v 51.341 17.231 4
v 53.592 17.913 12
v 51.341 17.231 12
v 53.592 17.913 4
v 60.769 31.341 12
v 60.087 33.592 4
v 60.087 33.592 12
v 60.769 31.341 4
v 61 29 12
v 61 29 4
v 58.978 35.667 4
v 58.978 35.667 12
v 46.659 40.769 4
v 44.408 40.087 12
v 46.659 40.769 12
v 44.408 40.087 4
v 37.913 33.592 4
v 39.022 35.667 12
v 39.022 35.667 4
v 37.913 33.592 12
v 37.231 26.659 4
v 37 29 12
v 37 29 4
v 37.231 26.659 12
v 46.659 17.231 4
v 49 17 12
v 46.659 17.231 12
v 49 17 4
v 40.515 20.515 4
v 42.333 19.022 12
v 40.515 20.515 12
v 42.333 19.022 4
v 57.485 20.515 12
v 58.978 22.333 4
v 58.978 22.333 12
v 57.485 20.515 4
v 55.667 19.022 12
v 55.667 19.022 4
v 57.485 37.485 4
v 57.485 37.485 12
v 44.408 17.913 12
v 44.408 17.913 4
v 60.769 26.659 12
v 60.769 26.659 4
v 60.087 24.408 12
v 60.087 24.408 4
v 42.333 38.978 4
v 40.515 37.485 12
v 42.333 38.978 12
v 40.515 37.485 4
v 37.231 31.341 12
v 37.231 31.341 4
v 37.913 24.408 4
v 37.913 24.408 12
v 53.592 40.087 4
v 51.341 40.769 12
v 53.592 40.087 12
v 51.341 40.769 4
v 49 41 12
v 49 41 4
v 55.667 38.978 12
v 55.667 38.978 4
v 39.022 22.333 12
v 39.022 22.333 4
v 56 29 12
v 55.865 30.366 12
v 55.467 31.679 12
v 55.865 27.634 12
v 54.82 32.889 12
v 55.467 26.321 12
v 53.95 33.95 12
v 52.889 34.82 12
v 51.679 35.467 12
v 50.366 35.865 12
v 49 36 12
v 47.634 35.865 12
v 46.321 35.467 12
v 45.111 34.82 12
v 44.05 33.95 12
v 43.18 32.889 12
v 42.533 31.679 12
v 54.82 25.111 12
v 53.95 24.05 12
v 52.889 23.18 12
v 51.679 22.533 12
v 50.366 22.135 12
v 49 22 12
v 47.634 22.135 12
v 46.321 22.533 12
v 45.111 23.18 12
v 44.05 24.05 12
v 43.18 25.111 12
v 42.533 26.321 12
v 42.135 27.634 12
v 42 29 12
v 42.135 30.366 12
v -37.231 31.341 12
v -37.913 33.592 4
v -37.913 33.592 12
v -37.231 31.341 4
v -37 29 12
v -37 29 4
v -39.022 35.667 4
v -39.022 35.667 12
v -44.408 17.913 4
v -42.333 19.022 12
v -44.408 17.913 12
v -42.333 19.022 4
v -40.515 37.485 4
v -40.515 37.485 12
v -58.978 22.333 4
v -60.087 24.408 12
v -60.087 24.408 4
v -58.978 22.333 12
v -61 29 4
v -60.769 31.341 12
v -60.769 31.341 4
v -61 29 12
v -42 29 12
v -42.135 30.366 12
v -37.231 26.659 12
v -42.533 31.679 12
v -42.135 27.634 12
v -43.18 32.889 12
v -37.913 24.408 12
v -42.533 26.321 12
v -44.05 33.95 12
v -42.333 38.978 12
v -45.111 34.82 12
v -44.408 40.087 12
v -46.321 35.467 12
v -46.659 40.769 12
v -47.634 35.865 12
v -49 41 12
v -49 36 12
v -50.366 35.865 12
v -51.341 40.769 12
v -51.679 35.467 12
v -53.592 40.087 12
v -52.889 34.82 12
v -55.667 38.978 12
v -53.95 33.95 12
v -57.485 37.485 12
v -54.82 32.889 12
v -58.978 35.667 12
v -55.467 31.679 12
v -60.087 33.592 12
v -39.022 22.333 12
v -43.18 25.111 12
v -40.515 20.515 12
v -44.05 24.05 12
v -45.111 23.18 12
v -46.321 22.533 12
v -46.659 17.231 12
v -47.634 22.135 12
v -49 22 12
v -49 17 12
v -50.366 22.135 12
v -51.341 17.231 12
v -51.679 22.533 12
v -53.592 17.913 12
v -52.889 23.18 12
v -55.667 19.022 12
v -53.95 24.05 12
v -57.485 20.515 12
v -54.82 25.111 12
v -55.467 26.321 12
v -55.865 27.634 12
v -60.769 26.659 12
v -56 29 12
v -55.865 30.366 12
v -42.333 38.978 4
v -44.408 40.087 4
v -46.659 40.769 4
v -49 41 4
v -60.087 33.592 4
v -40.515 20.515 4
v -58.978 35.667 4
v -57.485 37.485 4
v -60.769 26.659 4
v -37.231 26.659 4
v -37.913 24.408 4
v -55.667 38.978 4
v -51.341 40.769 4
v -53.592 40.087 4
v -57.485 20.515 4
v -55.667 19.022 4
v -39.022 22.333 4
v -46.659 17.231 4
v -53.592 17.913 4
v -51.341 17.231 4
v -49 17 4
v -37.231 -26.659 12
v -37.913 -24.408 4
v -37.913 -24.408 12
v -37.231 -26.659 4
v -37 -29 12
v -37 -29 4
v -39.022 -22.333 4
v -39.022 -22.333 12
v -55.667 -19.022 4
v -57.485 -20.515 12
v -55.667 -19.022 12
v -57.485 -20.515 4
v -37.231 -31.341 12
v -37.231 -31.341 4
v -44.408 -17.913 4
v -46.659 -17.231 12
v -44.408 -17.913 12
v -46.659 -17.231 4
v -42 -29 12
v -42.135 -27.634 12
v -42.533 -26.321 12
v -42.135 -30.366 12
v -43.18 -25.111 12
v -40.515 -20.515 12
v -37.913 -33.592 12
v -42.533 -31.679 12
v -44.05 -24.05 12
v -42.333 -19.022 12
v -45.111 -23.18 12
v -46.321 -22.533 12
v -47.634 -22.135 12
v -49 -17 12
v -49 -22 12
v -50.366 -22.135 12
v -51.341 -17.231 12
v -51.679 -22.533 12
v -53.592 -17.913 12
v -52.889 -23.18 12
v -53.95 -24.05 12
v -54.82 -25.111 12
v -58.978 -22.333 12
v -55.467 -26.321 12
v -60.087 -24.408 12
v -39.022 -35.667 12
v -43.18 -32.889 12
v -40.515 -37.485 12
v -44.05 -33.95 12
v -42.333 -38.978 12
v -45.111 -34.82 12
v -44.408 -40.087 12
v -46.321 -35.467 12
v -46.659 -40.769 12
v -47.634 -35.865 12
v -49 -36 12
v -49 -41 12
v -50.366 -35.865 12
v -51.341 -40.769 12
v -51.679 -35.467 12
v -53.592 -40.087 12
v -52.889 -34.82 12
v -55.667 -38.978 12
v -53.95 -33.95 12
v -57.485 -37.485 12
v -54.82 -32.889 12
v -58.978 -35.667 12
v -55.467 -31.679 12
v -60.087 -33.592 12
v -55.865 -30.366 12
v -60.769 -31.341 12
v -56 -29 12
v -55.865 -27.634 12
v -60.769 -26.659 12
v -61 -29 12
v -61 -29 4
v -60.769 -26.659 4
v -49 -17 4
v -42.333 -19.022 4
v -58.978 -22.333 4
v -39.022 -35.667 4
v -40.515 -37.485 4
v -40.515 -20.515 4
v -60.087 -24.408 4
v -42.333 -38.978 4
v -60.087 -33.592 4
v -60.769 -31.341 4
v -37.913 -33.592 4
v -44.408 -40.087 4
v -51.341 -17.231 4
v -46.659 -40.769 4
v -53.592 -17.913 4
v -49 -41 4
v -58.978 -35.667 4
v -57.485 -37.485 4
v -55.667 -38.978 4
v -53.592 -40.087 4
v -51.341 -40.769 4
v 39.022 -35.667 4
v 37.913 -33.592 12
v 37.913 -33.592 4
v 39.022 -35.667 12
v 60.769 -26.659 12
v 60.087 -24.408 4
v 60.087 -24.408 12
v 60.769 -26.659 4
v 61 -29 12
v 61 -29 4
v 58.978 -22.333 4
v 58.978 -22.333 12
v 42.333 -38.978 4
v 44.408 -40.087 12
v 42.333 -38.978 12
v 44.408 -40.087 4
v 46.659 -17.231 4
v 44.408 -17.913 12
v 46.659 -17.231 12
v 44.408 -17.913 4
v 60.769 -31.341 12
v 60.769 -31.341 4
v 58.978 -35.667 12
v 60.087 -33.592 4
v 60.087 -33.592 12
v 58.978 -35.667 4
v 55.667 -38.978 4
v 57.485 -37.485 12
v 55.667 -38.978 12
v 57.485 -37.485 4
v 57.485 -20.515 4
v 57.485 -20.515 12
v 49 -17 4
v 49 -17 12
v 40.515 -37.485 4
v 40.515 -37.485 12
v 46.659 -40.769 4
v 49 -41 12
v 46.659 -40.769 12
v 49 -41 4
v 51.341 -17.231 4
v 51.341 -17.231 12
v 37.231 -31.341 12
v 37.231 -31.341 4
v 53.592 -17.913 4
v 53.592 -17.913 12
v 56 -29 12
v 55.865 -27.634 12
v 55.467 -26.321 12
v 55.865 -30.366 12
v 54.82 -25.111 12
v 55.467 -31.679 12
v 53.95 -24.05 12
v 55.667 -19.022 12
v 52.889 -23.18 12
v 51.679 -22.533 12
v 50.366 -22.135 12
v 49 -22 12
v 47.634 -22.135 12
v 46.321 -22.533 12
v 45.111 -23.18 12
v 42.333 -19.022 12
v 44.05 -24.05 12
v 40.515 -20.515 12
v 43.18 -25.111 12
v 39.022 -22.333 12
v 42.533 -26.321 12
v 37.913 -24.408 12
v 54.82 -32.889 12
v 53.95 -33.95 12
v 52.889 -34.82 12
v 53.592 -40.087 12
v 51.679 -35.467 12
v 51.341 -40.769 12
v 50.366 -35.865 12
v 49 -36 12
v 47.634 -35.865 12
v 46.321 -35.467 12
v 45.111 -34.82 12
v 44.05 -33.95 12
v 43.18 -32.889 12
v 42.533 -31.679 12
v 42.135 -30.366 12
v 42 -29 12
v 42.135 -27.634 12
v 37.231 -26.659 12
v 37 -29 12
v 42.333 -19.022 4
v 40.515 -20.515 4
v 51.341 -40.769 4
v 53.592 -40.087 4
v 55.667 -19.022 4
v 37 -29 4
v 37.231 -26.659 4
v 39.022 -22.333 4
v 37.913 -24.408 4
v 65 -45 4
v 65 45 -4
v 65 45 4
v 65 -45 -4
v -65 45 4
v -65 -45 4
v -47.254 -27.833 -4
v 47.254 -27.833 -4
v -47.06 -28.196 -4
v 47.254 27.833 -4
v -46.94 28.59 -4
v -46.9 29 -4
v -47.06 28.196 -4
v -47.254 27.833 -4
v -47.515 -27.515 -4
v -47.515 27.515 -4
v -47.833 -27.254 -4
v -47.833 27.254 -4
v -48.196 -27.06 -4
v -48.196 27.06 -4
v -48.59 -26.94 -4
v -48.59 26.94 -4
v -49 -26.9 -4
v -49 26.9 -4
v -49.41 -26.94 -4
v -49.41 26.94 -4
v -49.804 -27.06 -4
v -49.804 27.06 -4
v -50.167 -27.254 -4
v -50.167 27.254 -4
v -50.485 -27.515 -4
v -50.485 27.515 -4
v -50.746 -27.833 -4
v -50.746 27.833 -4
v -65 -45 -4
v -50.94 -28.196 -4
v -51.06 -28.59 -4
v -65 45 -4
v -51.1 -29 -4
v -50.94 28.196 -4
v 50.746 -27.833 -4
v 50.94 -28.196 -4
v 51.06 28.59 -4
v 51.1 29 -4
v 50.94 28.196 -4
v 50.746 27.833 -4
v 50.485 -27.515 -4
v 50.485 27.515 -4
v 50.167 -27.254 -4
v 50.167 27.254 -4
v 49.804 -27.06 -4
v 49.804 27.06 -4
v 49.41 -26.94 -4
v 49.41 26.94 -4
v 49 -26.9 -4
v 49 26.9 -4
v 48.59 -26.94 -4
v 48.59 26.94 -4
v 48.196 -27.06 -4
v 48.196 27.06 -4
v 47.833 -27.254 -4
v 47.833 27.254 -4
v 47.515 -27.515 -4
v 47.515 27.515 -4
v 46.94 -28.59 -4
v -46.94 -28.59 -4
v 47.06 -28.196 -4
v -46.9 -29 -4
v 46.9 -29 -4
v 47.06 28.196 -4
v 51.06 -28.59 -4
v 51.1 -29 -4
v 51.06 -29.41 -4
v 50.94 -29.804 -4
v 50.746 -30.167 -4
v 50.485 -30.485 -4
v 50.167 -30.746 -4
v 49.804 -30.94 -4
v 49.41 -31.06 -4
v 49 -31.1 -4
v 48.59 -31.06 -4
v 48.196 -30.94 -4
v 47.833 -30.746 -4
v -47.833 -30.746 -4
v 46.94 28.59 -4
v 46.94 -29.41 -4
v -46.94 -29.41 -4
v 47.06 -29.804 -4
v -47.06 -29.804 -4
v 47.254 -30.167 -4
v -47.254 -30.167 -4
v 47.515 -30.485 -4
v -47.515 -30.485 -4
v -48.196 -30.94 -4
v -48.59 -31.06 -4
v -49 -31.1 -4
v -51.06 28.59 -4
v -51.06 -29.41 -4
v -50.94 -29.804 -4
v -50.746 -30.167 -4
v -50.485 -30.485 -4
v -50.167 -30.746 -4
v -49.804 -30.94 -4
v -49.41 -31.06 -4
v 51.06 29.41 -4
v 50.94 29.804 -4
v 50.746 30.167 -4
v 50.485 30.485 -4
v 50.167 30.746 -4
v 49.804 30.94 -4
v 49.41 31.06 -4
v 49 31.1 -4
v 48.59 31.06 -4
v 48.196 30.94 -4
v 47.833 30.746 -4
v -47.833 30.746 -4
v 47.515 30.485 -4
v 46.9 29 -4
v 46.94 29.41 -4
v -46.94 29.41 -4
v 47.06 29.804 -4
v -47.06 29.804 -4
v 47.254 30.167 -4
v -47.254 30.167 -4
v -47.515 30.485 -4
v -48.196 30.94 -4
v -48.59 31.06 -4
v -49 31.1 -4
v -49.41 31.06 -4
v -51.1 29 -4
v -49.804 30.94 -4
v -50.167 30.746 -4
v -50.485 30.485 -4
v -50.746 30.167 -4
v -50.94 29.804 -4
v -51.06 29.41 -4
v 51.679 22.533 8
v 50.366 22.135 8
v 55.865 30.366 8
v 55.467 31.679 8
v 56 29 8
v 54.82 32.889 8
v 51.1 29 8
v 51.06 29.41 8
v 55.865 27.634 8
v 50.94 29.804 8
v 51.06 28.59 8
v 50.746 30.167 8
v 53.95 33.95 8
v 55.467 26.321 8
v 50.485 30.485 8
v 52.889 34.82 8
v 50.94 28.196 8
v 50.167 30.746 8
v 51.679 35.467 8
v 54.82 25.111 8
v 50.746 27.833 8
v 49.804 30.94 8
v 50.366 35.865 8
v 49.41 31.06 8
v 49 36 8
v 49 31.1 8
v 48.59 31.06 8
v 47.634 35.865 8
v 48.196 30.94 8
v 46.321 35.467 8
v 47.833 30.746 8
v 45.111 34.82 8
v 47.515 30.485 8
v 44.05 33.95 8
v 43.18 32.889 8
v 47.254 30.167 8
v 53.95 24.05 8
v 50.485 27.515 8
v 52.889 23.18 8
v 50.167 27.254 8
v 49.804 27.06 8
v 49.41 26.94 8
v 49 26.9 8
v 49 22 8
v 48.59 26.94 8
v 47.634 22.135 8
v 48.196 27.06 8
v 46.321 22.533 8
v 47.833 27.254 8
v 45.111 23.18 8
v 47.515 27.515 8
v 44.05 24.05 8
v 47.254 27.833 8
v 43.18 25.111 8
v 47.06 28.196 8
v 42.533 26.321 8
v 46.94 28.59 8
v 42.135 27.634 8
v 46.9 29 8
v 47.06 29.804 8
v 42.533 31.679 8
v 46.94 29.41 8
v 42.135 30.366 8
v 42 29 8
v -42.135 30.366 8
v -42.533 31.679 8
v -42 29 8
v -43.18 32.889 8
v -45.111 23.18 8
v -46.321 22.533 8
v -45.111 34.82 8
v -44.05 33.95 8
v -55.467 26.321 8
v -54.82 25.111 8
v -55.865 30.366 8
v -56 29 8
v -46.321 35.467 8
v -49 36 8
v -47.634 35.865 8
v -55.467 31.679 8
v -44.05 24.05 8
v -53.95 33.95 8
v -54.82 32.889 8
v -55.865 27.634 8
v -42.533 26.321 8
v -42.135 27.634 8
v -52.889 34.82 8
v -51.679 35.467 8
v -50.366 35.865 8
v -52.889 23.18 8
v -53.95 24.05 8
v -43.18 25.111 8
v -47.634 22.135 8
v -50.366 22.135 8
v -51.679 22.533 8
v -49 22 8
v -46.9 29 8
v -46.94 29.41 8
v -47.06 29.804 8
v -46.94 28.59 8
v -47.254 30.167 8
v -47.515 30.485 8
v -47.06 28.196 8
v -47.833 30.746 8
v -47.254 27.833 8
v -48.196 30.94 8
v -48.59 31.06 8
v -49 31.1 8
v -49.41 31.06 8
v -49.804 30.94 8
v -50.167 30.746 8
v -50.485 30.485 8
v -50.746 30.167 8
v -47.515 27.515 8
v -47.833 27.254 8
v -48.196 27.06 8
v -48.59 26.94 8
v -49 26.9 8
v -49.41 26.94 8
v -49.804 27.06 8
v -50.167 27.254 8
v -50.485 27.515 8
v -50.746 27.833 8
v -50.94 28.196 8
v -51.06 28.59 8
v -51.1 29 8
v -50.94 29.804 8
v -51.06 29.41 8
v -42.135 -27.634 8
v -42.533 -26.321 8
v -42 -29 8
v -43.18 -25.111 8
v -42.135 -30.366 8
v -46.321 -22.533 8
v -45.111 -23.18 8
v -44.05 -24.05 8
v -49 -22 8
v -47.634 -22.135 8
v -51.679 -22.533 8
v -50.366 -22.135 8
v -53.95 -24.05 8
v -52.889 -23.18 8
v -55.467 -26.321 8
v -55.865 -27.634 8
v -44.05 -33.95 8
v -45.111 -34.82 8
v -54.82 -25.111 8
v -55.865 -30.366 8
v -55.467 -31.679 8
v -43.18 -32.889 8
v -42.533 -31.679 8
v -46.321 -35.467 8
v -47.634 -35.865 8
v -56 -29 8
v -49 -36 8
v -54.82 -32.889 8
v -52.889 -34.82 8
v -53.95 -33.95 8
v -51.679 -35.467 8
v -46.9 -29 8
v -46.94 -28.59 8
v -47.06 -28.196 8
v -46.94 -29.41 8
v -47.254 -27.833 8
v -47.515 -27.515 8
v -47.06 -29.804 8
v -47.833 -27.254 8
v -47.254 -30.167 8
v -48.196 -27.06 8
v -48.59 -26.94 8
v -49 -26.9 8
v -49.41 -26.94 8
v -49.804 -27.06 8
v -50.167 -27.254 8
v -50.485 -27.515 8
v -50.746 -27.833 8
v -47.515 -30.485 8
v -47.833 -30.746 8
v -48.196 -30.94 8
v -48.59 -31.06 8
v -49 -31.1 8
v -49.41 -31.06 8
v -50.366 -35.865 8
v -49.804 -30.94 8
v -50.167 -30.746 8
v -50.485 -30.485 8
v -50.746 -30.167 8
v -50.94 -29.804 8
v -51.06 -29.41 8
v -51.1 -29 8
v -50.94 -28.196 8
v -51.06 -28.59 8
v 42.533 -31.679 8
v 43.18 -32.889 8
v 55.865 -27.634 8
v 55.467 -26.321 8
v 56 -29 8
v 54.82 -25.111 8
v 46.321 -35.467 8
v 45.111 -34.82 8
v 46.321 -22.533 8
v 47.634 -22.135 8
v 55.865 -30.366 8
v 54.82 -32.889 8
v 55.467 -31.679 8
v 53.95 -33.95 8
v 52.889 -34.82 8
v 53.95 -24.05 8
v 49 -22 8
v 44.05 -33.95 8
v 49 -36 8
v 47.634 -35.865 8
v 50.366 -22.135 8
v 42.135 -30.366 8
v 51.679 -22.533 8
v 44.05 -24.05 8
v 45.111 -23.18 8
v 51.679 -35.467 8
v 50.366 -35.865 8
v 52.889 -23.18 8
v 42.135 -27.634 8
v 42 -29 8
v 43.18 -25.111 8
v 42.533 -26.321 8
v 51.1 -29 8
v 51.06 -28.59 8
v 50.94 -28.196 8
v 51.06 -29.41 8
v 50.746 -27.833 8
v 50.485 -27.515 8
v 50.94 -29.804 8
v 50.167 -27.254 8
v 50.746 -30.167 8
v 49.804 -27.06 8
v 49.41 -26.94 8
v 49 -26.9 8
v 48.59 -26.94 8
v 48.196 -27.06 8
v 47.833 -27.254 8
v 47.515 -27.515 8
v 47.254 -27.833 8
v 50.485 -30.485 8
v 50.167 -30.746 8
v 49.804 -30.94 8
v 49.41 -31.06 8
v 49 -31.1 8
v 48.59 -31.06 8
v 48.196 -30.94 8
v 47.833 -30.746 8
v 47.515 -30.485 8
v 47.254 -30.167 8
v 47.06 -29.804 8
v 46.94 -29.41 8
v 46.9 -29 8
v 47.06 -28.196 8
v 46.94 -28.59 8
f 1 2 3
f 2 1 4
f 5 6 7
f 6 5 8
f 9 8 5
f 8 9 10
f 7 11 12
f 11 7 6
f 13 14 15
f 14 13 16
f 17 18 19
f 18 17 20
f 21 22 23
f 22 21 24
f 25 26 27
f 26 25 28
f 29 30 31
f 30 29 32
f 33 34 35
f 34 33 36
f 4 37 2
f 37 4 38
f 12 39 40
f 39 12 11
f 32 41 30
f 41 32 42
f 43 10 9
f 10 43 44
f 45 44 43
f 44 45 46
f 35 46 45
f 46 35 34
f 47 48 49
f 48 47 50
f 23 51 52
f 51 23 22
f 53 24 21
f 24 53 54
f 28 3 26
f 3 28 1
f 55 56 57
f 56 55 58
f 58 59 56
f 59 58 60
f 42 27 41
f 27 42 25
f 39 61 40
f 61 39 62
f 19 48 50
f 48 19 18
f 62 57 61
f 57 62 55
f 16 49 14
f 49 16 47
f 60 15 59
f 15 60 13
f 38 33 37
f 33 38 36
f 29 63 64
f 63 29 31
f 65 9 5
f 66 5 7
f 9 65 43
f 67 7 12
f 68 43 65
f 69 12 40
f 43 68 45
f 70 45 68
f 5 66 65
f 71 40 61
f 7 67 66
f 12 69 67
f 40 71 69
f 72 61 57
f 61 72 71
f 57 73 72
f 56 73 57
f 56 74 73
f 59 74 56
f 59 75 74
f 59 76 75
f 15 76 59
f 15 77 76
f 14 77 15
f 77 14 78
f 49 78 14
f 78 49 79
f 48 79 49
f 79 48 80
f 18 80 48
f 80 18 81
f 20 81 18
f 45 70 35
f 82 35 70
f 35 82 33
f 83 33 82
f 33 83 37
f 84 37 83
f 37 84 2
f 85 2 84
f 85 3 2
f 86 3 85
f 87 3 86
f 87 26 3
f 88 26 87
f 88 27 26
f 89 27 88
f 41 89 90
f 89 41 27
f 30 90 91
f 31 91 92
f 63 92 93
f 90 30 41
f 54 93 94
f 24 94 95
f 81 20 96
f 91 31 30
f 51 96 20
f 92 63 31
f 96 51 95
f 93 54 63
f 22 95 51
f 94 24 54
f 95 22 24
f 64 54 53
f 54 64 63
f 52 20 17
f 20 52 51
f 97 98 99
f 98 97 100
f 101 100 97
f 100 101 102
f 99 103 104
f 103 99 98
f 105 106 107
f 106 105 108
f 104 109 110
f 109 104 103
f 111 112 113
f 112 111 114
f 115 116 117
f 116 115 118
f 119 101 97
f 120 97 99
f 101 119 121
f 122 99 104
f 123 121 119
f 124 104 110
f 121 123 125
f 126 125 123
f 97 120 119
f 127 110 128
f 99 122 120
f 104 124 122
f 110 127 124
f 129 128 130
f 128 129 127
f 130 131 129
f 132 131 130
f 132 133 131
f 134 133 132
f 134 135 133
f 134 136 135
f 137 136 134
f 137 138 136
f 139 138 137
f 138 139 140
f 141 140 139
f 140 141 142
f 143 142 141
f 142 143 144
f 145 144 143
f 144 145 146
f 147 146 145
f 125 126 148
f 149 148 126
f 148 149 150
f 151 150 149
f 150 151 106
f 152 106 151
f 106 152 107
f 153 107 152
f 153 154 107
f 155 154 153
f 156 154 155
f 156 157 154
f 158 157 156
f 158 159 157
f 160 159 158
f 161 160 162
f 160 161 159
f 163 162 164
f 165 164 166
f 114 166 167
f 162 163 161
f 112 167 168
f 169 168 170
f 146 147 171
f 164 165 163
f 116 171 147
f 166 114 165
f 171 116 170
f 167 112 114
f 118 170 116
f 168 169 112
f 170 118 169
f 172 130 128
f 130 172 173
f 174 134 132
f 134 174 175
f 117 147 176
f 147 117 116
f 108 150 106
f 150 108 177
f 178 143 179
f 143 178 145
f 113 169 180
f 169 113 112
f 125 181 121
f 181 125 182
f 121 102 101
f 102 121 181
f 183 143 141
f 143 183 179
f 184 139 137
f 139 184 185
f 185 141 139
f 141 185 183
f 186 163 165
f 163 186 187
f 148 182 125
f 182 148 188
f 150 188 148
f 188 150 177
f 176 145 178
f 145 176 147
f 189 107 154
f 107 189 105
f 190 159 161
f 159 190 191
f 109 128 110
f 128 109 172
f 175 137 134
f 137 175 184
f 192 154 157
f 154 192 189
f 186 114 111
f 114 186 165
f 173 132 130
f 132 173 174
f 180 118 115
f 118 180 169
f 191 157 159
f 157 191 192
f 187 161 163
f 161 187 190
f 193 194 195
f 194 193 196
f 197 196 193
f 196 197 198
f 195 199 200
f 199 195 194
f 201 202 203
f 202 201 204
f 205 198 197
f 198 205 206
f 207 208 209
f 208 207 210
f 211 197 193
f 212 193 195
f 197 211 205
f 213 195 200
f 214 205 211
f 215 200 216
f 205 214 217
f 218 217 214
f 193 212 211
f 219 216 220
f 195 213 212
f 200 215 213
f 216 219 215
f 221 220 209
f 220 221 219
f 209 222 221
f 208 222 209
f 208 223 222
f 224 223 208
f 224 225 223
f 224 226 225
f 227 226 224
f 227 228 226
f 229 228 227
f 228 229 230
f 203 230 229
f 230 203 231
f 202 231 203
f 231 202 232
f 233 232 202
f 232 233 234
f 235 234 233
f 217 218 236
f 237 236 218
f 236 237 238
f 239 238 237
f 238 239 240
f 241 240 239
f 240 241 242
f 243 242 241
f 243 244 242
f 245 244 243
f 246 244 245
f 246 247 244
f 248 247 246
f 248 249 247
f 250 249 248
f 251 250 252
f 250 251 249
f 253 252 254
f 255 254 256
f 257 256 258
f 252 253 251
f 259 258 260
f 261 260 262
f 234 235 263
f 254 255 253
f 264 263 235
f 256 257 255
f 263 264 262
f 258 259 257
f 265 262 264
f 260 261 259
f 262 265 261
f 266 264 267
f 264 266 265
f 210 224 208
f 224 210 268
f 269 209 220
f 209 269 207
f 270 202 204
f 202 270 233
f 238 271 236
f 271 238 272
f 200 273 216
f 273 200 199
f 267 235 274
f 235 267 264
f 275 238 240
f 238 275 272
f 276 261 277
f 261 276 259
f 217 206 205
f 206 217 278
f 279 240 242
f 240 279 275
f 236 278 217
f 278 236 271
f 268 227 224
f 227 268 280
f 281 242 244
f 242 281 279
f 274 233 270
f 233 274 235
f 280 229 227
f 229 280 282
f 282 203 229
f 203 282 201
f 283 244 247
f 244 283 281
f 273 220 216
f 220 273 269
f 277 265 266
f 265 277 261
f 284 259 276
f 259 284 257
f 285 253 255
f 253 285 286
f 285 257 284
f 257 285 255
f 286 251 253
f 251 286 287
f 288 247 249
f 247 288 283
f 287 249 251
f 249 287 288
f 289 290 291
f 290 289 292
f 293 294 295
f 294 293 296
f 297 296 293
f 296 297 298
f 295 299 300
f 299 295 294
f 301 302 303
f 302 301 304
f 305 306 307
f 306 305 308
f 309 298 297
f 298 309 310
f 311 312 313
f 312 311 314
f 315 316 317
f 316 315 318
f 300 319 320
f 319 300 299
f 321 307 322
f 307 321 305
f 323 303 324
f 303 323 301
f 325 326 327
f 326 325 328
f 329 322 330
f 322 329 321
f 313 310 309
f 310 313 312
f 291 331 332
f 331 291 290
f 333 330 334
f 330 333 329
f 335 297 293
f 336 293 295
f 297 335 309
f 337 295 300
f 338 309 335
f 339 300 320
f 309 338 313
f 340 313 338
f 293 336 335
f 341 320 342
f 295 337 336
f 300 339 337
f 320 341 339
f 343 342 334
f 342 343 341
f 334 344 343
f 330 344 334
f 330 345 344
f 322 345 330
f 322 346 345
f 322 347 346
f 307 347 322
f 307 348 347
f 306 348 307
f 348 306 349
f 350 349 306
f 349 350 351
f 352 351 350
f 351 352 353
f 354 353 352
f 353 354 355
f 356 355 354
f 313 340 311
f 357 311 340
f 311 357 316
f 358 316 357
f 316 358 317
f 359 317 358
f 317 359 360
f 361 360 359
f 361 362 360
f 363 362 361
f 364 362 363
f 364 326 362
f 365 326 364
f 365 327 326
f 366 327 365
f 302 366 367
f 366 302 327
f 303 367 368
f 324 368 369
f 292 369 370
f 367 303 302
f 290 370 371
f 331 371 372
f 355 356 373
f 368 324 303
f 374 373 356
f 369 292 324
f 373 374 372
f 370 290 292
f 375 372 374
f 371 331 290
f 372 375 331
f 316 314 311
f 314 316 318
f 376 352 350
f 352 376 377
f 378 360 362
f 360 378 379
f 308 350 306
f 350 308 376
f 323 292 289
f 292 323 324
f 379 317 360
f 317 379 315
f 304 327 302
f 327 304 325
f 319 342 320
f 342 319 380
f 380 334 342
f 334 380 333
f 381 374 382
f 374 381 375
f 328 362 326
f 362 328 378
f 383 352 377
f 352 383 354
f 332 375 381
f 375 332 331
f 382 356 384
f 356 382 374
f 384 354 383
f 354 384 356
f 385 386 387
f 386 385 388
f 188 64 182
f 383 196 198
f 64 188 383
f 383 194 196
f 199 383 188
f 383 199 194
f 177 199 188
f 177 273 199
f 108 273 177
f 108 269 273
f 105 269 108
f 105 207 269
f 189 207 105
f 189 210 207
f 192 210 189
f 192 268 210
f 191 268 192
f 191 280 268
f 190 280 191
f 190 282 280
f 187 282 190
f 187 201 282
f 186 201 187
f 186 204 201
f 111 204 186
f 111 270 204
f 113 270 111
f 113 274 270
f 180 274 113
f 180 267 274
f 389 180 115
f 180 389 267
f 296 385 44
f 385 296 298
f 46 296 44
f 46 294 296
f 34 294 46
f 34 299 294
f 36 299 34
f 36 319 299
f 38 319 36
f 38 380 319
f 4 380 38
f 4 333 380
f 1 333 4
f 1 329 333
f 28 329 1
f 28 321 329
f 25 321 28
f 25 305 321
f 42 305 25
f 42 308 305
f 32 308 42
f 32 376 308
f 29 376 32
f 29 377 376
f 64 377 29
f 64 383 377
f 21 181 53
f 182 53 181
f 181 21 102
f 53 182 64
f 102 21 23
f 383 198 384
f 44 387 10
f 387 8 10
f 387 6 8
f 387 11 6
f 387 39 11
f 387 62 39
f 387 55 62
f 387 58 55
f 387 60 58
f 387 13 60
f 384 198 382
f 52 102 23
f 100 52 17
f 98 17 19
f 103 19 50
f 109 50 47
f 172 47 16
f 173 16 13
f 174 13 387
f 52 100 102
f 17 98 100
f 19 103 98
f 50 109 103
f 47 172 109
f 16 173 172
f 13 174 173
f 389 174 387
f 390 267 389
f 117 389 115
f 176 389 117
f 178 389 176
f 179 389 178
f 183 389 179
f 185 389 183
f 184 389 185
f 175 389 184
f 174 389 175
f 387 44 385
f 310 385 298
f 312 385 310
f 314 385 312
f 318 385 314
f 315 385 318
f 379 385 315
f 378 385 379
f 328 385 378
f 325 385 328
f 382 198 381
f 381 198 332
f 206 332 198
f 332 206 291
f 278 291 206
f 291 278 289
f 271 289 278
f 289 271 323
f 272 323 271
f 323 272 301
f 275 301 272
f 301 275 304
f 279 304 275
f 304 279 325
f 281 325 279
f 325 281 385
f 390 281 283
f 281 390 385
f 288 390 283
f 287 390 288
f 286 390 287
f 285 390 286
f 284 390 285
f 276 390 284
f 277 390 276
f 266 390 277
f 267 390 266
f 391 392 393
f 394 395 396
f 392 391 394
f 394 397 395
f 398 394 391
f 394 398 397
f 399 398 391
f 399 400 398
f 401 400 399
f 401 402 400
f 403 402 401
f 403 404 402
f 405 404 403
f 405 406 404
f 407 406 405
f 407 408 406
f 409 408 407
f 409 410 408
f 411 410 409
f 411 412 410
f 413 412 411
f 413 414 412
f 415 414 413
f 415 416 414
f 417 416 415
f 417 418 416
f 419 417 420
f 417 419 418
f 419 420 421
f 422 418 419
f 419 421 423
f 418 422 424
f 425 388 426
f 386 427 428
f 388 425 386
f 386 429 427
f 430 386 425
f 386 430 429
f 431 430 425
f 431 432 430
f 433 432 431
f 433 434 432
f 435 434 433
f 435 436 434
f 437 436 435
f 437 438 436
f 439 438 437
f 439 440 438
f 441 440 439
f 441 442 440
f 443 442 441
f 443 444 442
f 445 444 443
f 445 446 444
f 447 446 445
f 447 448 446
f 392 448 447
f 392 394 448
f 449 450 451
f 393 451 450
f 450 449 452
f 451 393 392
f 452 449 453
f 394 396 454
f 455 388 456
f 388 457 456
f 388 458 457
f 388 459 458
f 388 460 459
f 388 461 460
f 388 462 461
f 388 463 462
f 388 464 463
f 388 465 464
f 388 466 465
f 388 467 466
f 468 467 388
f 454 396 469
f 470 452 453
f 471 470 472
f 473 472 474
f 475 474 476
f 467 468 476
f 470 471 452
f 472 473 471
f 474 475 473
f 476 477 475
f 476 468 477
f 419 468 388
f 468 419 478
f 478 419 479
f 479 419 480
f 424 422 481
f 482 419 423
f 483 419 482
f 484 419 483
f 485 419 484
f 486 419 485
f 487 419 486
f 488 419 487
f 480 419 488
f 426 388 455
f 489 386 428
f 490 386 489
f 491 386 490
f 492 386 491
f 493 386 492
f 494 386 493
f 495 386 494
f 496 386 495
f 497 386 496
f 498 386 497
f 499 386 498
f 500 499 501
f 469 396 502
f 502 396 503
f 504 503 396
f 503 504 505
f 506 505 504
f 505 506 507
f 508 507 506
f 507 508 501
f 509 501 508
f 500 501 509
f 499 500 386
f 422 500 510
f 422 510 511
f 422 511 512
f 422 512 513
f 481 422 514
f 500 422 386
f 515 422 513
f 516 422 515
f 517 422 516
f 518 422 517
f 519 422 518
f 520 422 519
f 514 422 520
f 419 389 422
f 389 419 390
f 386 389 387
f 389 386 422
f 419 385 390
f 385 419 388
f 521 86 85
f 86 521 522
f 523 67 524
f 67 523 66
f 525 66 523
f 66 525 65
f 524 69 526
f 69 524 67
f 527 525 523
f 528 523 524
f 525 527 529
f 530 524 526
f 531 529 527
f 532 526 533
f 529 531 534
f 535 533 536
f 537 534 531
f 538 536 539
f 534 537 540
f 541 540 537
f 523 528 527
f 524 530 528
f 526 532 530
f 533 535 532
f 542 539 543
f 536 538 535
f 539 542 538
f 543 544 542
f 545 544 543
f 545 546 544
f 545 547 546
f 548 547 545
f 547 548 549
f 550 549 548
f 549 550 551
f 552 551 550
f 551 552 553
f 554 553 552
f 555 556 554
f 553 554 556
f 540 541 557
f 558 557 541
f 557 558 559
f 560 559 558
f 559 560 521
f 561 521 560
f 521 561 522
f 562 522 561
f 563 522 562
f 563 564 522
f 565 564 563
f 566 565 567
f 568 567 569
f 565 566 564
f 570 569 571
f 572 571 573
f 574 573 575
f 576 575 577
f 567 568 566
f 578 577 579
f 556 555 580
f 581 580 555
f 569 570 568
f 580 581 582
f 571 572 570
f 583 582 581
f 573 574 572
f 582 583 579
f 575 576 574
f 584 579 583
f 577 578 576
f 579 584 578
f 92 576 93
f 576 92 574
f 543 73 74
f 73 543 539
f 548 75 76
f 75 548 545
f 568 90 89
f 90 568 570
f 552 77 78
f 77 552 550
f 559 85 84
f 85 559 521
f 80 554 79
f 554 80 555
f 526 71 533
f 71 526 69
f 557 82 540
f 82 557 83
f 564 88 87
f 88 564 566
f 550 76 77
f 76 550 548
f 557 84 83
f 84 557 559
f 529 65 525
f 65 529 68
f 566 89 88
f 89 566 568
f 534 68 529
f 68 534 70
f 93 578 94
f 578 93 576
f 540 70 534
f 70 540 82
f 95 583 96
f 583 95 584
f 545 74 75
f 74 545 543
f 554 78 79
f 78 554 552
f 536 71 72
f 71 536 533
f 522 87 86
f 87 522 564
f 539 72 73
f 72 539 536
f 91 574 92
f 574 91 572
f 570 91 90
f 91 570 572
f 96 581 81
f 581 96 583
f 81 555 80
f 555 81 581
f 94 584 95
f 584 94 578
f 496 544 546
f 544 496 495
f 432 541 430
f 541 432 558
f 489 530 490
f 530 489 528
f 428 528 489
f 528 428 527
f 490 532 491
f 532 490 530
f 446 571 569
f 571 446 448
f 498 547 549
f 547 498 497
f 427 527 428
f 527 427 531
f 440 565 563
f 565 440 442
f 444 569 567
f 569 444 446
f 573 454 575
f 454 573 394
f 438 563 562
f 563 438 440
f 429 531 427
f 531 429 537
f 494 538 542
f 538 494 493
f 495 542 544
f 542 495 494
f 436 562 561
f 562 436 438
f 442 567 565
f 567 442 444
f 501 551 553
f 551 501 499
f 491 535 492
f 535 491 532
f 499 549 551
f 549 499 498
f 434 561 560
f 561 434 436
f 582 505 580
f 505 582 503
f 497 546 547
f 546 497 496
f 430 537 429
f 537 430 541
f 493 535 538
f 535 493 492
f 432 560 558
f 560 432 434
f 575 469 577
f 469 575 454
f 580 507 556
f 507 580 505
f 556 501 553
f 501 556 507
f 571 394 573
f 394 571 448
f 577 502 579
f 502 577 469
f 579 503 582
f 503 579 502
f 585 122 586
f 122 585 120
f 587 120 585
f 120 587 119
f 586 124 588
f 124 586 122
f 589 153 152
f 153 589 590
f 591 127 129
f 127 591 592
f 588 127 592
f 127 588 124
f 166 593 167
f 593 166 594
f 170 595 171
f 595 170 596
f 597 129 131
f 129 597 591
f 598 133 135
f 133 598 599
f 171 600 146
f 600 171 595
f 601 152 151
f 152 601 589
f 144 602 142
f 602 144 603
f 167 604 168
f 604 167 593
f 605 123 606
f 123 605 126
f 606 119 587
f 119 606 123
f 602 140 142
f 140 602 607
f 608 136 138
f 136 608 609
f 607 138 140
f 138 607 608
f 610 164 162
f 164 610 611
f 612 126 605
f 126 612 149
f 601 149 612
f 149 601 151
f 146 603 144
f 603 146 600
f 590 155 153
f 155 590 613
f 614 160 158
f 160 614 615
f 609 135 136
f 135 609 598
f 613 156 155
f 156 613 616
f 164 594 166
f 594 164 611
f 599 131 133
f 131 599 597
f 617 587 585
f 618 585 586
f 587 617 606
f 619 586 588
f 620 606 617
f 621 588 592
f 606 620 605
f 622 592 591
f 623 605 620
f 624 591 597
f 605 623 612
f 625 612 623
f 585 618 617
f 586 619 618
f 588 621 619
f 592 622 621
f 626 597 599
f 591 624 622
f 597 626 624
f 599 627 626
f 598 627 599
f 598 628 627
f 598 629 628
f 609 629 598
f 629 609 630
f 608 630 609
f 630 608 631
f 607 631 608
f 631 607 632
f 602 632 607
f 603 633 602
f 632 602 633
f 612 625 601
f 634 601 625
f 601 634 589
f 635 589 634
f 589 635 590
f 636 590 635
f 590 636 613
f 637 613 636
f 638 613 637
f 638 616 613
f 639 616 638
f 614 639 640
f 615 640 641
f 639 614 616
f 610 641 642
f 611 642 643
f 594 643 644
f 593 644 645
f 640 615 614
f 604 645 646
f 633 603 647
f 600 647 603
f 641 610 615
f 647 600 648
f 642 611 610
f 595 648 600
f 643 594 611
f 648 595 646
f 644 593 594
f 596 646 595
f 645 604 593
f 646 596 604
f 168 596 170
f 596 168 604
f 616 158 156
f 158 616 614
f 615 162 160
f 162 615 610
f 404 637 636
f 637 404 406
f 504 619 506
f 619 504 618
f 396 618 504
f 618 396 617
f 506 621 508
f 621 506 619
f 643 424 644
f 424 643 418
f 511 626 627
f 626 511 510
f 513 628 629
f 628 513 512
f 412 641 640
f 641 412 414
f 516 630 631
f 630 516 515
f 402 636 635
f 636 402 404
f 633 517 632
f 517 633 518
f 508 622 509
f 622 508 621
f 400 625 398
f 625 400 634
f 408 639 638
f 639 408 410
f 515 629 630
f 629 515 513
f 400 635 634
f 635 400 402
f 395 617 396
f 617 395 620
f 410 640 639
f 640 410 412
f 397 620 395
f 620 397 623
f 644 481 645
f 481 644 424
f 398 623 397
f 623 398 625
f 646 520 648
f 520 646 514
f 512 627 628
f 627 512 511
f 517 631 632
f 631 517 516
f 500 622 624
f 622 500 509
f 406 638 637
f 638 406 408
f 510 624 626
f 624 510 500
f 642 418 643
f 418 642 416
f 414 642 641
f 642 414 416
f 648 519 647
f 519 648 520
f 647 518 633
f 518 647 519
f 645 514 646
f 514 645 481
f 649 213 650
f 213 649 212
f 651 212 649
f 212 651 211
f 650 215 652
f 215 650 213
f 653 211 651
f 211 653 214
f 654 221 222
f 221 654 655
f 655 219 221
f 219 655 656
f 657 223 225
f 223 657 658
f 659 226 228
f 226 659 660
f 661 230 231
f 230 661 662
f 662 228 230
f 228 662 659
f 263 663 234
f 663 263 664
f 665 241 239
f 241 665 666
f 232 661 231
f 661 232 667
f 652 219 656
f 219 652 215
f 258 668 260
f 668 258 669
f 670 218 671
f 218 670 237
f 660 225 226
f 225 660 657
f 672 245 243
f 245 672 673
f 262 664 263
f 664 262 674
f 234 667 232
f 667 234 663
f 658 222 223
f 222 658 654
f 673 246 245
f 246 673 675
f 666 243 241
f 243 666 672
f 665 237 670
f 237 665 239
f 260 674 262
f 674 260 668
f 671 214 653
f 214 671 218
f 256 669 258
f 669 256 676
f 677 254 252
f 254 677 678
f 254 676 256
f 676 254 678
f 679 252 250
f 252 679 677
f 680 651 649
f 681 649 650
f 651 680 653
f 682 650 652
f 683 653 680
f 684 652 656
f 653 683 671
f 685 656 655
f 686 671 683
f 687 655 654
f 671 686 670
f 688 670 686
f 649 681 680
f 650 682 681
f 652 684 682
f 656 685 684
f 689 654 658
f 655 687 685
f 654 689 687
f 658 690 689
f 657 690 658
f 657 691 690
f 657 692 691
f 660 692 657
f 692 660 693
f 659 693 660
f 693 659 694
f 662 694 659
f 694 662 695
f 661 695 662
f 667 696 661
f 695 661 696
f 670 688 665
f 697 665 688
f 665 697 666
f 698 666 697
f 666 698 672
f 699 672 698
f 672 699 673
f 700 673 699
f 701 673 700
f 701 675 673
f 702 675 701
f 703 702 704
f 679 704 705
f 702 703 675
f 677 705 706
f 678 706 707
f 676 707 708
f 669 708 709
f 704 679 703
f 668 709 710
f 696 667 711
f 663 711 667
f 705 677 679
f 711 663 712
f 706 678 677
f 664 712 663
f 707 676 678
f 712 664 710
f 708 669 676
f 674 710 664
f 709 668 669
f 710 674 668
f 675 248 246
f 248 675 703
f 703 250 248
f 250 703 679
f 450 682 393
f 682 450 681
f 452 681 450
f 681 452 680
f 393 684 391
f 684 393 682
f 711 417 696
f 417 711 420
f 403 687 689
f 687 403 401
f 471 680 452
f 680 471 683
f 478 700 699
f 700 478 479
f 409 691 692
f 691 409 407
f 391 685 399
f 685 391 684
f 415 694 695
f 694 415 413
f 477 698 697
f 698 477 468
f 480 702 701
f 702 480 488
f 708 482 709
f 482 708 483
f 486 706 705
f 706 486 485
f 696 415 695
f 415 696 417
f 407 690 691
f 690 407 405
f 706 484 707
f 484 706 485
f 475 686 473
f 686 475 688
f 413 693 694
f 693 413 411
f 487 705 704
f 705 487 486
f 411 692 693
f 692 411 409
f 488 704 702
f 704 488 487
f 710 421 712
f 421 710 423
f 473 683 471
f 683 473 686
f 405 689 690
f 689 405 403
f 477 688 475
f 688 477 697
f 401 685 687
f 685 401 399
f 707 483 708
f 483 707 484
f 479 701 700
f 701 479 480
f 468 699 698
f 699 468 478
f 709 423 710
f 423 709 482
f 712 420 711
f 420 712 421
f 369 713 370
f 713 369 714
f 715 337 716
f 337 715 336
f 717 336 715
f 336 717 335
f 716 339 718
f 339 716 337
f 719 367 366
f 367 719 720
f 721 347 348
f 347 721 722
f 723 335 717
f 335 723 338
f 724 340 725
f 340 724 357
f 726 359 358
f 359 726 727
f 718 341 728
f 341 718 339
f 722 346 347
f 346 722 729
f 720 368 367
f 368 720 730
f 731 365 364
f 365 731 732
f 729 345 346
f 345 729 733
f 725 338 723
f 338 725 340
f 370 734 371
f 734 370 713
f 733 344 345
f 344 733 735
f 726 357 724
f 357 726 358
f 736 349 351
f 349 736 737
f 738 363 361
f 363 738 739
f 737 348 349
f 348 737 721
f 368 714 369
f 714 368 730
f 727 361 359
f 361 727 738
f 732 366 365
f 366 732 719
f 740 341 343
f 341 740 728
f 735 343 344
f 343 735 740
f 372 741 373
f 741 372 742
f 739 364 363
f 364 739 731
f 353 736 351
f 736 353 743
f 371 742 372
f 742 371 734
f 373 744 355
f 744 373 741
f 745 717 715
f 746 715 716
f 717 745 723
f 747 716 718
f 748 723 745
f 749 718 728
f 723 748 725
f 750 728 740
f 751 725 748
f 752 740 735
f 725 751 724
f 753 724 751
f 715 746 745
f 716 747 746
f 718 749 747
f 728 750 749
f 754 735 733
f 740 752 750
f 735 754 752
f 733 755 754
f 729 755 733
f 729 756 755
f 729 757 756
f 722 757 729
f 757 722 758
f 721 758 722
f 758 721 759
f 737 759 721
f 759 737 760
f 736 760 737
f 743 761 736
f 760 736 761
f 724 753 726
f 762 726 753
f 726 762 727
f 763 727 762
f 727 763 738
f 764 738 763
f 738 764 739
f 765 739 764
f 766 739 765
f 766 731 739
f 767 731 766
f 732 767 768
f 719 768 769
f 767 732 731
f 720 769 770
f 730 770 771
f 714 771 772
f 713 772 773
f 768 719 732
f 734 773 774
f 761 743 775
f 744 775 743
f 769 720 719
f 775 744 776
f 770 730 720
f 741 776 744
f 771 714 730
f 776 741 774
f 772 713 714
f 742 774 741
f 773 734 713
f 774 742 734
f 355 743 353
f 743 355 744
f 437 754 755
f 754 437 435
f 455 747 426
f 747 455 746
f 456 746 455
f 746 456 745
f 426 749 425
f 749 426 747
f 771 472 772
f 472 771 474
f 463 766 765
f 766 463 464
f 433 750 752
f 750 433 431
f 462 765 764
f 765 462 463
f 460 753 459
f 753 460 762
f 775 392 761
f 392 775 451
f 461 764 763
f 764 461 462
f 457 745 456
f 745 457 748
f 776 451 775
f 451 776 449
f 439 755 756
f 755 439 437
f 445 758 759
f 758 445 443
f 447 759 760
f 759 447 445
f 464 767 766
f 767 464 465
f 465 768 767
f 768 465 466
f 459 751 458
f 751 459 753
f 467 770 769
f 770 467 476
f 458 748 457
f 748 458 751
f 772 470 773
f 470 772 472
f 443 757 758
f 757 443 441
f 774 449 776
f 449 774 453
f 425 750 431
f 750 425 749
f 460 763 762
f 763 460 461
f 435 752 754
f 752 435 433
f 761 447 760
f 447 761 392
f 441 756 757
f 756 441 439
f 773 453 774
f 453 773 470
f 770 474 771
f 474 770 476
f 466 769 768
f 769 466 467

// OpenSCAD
$fn = 32;

// ----------------------------------------------------------------------
// Socket pad plate
// bosses with counterbored sockets for the screws
// ----------------------------------------------------------------------

// --- parameters (mm) ---
base_t = 8;            // base plate thickness
boss_h = 8;            // boss height above the base plate
boss_d = 24;           // boss diameter
socket_d = 14;         // socket diameter
socket_depth = 4;      // socket depth from the boss face
bolt_d = 4.2;          // screw clearance hole through the socket floor
plate = [130, 90, 8];  // overall size (x, y, z)
edge = 16;             // boss centre offset from the plate edge
pads = 4;              // boss count, one per corner

// --- derived feature positions (mm) ---
height = base_t + boss_h;        // = 16   overall height of the part
corner_x = plate[0] / 2 - edge;  // = 49   boss centre X
corner_y = plate[1] / 2 - edge;  // = 29   boss centre Y
feature_centers = [
  [corner_x, corner_y],
  [-corner_x, corner_y],
  [-corner_x, -corner_y],
  [corner_x, -corner_y]
];   // boss centres: sockets, holes and the pads themselves are placed from here

// base plate, bosses on feature_centers, socket + through hole in each
difference() {
  union() {
    cube(plate, center = true);
    for (centre = feature_centers)
      translate([centre[0], centre[1], plate[2] / 2 - 1])
        cylinder(d = boss_d, h = boss_h + 1);
  }
  for (centre = feature_centers) {
    translate([centre[0], centre[1], plate[2] / 2 + boss_h - socket_depth])
      cylinder(d = socket_d, h = socket_depth + 1);
    translate([centre[0], centre[1], -height])
      cylinder(d = bolt_d, h = 2 * height + 2);  // through the socket floor
  }
}
